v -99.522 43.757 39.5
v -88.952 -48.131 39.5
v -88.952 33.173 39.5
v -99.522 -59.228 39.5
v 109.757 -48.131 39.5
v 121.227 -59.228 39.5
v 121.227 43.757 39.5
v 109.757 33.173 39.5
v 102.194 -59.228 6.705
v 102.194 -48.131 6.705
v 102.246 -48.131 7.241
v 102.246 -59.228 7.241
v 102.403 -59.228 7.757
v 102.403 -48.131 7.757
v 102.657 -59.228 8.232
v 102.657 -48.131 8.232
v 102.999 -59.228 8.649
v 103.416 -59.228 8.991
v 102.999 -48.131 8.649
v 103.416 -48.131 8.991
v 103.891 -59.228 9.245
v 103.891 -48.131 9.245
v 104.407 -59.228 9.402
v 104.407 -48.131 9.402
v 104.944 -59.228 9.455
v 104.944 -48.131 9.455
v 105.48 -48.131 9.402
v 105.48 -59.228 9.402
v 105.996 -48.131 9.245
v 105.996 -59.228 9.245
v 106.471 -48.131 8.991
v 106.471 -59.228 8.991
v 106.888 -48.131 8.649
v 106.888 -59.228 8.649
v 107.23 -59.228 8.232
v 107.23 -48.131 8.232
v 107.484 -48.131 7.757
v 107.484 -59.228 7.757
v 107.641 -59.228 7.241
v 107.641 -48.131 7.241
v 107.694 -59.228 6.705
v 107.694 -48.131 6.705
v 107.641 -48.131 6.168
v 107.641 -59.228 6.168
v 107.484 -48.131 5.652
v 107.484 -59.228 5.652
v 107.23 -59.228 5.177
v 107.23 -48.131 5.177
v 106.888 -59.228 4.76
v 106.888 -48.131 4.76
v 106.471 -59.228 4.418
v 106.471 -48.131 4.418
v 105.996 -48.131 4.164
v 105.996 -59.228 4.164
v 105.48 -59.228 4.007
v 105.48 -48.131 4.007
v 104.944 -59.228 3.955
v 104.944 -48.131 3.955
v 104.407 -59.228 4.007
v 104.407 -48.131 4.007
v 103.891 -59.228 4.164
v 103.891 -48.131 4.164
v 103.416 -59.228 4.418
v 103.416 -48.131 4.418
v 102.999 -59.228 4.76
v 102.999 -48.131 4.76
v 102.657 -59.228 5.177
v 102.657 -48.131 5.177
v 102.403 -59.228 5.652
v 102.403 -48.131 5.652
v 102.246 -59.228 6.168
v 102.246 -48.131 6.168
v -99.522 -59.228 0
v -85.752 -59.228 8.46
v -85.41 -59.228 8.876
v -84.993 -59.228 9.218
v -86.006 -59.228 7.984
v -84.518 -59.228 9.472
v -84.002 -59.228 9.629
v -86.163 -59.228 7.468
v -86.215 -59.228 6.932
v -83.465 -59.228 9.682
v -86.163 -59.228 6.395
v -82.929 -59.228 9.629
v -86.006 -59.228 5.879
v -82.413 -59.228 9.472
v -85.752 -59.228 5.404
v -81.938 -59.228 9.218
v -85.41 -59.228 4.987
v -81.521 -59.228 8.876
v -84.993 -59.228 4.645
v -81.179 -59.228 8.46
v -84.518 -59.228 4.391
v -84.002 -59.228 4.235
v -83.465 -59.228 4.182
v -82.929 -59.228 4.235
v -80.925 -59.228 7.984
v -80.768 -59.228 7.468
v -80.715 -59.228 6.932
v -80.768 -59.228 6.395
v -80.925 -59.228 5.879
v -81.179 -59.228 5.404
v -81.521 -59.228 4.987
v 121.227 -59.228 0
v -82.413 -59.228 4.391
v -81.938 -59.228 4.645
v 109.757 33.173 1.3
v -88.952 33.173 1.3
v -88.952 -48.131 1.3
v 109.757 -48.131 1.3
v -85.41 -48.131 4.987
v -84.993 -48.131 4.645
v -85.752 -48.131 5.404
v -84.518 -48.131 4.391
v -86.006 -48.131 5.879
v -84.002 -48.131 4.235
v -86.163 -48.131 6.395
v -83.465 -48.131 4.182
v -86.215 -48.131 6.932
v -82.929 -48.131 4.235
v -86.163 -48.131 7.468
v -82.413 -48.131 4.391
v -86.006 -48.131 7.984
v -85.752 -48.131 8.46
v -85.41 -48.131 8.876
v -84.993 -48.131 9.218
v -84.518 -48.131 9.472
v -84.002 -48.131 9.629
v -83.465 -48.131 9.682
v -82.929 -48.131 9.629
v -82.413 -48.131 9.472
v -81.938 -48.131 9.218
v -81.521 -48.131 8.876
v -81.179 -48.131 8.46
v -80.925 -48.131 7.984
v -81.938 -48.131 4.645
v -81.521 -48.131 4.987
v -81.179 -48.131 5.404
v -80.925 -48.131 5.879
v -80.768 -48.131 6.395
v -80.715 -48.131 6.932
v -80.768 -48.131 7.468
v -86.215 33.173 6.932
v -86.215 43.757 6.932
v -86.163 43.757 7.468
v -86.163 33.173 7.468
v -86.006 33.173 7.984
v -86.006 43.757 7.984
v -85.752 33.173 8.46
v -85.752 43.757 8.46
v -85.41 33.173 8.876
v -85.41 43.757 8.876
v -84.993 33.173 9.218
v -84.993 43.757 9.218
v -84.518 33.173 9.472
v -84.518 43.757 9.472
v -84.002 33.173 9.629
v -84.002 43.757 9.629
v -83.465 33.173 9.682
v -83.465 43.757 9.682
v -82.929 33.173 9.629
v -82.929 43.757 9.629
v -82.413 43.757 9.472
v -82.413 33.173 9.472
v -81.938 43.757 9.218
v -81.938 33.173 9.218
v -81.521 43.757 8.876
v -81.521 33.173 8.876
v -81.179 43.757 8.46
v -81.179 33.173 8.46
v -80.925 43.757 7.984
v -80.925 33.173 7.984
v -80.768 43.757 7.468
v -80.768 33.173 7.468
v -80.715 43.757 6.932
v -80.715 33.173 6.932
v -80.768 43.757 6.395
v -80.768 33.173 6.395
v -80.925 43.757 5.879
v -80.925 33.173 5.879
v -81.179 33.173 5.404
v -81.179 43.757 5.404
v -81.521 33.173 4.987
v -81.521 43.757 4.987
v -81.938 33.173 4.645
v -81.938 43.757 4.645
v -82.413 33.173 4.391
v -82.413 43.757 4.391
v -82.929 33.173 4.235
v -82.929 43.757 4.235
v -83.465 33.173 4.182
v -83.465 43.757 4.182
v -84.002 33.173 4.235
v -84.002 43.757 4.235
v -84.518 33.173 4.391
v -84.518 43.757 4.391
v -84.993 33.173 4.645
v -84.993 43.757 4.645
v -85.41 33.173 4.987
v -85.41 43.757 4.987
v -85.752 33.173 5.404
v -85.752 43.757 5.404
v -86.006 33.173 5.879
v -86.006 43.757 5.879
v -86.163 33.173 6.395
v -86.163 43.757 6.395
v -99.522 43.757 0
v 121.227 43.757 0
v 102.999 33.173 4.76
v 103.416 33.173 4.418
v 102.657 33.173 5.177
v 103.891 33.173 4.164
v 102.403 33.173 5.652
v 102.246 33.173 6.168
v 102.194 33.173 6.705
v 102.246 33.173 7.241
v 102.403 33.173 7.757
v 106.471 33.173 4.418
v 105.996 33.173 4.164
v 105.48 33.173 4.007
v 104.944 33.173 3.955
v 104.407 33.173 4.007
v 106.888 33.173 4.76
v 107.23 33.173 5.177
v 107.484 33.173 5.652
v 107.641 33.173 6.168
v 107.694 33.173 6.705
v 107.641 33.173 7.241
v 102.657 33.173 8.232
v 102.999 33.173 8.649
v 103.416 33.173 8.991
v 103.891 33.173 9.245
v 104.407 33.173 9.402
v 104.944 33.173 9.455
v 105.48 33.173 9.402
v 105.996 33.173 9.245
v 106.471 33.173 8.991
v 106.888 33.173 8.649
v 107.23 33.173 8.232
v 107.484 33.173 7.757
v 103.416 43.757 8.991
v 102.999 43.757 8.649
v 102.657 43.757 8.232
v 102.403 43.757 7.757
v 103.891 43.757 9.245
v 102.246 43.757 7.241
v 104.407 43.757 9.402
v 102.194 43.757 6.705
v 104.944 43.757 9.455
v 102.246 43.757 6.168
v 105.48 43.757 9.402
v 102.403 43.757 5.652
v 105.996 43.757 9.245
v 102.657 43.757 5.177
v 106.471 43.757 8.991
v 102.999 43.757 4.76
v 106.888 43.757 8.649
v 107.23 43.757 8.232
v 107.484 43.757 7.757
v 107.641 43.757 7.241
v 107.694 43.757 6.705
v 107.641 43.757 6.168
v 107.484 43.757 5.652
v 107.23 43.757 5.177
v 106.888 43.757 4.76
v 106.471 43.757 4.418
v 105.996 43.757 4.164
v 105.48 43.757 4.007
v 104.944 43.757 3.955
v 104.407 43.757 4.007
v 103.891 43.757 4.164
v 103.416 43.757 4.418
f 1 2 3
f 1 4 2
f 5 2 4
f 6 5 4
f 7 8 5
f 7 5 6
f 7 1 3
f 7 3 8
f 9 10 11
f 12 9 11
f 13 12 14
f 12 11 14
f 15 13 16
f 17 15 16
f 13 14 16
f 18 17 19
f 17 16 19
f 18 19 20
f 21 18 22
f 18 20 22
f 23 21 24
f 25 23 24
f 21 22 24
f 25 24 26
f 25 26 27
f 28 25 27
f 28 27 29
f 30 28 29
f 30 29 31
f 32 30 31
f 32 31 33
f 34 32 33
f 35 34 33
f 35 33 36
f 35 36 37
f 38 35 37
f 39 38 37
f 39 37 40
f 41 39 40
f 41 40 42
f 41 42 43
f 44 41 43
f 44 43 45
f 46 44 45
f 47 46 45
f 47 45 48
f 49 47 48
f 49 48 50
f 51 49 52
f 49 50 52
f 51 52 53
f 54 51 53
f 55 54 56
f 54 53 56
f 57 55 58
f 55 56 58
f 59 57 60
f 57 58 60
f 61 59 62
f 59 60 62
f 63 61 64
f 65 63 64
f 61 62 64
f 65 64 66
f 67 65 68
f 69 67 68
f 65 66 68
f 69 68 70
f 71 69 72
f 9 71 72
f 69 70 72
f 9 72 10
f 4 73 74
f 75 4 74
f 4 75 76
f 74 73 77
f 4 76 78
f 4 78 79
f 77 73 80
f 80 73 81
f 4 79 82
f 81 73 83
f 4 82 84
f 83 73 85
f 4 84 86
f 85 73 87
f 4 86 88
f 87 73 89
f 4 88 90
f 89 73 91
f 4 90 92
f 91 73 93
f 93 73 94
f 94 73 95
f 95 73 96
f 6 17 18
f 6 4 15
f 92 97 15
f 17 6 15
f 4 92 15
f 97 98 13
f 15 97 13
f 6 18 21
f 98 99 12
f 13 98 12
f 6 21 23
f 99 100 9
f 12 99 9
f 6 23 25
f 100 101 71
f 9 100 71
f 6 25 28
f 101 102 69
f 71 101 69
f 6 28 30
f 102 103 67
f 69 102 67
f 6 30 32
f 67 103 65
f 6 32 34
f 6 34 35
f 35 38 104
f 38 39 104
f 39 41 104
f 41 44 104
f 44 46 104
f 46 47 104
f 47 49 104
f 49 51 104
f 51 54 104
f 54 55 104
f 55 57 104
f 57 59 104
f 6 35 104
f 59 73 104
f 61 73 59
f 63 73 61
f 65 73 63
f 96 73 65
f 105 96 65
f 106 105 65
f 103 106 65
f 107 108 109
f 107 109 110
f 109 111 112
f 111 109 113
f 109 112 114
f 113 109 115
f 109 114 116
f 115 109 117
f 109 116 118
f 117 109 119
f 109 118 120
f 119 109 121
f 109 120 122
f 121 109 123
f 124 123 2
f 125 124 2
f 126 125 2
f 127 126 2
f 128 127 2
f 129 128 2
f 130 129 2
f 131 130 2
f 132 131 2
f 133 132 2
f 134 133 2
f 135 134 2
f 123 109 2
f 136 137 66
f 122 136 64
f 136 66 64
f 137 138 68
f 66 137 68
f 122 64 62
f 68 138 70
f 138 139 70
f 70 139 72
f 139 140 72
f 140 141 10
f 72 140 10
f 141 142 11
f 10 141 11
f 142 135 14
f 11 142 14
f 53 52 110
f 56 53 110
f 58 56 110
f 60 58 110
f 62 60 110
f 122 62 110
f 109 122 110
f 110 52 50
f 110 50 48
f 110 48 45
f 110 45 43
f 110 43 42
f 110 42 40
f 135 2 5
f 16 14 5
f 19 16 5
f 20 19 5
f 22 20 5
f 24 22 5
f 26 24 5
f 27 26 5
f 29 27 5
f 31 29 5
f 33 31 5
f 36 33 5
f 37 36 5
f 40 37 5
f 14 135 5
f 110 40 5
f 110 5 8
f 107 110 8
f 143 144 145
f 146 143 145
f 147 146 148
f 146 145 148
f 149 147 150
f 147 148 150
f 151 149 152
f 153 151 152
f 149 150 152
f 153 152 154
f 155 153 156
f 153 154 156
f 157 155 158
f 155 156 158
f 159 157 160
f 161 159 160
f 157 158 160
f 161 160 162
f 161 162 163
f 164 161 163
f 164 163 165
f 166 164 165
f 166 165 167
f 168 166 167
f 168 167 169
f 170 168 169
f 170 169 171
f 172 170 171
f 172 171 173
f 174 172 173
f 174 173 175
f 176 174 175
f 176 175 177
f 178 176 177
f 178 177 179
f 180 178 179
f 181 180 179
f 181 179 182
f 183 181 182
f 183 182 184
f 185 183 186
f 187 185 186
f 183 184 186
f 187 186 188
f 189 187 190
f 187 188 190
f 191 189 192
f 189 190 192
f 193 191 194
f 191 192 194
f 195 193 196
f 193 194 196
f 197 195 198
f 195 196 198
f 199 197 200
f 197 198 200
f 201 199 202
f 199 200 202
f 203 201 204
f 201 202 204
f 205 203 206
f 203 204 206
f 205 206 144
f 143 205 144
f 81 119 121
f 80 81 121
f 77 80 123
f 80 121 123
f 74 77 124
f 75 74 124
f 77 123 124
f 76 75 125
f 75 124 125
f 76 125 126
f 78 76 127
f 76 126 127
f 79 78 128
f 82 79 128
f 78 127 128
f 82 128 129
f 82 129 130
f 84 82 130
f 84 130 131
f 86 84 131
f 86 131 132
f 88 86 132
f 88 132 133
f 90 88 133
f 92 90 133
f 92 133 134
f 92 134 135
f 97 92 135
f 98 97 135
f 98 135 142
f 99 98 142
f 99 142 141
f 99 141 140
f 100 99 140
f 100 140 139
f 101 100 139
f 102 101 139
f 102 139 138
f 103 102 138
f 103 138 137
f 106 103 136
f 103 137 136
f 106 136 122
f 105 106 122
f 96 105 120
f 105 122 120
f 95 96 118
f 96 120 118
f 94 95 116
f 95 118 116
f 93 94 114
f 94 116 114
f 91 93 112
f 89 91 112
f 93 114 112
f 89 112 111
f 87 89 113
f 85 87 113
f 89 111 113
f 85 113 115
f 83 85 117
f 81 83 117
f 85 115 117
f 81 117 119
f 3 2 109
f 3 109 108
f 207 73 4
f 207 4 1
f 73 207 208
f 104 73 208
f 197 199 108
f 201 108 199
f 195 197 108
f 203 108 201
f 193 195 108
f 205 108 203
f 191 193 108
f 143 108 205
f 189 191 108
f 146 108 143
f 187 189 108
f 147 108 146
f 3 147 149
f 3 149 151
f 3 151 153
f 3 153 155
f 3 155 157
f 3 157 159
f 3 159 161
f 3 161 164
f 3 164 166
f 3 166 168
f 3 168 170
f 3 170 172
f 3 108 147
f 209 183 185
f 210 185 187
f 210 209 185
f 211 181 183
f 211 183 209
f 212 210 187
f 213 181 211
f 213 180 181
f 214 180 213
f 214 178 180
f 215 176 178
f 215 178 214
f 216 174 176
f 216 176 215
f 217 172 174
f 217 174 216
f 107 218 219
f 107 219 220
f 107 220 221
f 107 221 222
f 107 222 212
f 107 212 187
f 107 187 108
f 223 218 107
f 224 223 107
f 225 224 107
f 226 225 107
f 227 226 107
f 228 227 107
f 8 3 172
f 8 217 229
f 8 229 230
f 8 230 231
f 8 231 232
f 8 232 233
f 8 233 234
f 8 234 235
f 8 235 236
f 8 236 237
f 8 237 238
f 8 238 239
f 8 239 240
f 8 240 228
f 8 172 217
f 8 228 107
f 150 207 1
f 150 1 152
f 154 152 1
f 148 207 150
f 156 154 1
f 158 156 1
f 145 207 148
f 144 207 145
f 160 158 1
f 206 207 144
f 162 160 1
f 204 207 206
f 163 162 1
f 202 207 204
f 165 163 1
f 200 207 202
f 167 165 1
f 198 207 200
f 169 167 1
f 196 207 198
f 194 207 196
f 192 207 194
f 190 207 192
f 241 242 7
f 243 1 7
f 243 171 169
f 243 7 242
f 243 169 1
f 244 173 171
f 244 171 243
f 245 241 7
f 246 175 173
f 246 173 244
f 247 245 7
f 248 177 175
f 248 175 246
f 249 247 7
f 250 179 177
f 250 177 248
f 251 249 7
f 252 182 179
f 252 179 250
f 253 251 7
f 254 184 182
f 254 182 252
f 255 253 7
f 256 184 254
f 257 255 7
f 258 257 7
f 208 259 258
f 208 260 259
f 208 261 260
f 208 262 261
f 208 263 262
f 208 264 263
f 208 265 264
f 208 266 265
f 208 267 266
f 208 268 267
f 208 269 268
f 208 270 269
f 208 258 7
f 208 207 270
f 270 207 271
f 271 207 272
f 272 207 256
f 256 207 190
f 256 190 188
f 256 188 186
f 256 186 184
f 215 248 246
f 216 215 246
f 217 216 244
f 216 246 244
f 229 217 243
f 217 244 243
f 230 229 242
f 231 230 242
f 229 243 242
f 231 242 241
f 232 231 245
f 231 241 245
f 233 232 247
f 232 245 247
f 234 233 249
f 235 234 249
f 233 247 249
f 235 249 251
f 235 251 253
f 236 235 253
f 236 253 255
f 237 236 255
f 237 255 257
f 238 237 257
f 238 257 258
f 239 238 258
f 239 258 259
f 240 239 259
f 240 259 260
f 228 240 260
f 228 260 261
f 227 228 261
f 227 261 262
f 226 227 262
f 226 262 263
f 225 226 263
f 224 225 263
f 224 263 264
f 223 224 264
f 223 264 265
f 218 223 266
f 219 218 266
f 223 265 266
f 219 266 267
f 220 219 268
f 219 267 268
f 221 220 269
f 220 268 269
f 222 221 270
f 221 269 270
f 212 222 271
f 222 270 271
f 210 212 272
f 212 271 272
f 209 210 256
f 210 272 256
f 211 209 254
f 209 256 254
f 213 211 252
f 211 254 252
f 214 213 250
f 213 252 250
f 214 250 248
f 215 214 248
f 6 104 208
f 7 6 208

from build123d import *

# Parameters (mm, degrees)
F0_W     = 220.749088
F0_H     = 102.985457
F1_DEPTH = 39.5
F2_W     = 198.709123
F2_H     = 81.303883
F3_DEPTH = 38.2
F5_D     = 5.5


with BuildPart() as f1:
    # F0 (on Top) → F1 (new body)
    with BuildSketch(Plane.XY):
        with Locations((10.852728, -7.735457)):
            Rectangle(F0_W, F0_H)
    extrude(amount=F1_DEPTH)

    # F2 (on face) → F3 (cut)
    with BuildSketch(Plane.XY.offset(39.5)):
        with Locations((10.40272, -7.478898)):
            Rectangle(F2_W, F2_H)
    extrude(amount=-F3_DEPTH, mode=Mode.SUBTRACT)

    # F5 (through all)
    with Locations(Plane.XZ.offset(59.228186)):
        with Locations((-83.465457, 6.931819), (104.943641, 6.704546)):
            Hole(F5_D / 2)


solid = f1.part
